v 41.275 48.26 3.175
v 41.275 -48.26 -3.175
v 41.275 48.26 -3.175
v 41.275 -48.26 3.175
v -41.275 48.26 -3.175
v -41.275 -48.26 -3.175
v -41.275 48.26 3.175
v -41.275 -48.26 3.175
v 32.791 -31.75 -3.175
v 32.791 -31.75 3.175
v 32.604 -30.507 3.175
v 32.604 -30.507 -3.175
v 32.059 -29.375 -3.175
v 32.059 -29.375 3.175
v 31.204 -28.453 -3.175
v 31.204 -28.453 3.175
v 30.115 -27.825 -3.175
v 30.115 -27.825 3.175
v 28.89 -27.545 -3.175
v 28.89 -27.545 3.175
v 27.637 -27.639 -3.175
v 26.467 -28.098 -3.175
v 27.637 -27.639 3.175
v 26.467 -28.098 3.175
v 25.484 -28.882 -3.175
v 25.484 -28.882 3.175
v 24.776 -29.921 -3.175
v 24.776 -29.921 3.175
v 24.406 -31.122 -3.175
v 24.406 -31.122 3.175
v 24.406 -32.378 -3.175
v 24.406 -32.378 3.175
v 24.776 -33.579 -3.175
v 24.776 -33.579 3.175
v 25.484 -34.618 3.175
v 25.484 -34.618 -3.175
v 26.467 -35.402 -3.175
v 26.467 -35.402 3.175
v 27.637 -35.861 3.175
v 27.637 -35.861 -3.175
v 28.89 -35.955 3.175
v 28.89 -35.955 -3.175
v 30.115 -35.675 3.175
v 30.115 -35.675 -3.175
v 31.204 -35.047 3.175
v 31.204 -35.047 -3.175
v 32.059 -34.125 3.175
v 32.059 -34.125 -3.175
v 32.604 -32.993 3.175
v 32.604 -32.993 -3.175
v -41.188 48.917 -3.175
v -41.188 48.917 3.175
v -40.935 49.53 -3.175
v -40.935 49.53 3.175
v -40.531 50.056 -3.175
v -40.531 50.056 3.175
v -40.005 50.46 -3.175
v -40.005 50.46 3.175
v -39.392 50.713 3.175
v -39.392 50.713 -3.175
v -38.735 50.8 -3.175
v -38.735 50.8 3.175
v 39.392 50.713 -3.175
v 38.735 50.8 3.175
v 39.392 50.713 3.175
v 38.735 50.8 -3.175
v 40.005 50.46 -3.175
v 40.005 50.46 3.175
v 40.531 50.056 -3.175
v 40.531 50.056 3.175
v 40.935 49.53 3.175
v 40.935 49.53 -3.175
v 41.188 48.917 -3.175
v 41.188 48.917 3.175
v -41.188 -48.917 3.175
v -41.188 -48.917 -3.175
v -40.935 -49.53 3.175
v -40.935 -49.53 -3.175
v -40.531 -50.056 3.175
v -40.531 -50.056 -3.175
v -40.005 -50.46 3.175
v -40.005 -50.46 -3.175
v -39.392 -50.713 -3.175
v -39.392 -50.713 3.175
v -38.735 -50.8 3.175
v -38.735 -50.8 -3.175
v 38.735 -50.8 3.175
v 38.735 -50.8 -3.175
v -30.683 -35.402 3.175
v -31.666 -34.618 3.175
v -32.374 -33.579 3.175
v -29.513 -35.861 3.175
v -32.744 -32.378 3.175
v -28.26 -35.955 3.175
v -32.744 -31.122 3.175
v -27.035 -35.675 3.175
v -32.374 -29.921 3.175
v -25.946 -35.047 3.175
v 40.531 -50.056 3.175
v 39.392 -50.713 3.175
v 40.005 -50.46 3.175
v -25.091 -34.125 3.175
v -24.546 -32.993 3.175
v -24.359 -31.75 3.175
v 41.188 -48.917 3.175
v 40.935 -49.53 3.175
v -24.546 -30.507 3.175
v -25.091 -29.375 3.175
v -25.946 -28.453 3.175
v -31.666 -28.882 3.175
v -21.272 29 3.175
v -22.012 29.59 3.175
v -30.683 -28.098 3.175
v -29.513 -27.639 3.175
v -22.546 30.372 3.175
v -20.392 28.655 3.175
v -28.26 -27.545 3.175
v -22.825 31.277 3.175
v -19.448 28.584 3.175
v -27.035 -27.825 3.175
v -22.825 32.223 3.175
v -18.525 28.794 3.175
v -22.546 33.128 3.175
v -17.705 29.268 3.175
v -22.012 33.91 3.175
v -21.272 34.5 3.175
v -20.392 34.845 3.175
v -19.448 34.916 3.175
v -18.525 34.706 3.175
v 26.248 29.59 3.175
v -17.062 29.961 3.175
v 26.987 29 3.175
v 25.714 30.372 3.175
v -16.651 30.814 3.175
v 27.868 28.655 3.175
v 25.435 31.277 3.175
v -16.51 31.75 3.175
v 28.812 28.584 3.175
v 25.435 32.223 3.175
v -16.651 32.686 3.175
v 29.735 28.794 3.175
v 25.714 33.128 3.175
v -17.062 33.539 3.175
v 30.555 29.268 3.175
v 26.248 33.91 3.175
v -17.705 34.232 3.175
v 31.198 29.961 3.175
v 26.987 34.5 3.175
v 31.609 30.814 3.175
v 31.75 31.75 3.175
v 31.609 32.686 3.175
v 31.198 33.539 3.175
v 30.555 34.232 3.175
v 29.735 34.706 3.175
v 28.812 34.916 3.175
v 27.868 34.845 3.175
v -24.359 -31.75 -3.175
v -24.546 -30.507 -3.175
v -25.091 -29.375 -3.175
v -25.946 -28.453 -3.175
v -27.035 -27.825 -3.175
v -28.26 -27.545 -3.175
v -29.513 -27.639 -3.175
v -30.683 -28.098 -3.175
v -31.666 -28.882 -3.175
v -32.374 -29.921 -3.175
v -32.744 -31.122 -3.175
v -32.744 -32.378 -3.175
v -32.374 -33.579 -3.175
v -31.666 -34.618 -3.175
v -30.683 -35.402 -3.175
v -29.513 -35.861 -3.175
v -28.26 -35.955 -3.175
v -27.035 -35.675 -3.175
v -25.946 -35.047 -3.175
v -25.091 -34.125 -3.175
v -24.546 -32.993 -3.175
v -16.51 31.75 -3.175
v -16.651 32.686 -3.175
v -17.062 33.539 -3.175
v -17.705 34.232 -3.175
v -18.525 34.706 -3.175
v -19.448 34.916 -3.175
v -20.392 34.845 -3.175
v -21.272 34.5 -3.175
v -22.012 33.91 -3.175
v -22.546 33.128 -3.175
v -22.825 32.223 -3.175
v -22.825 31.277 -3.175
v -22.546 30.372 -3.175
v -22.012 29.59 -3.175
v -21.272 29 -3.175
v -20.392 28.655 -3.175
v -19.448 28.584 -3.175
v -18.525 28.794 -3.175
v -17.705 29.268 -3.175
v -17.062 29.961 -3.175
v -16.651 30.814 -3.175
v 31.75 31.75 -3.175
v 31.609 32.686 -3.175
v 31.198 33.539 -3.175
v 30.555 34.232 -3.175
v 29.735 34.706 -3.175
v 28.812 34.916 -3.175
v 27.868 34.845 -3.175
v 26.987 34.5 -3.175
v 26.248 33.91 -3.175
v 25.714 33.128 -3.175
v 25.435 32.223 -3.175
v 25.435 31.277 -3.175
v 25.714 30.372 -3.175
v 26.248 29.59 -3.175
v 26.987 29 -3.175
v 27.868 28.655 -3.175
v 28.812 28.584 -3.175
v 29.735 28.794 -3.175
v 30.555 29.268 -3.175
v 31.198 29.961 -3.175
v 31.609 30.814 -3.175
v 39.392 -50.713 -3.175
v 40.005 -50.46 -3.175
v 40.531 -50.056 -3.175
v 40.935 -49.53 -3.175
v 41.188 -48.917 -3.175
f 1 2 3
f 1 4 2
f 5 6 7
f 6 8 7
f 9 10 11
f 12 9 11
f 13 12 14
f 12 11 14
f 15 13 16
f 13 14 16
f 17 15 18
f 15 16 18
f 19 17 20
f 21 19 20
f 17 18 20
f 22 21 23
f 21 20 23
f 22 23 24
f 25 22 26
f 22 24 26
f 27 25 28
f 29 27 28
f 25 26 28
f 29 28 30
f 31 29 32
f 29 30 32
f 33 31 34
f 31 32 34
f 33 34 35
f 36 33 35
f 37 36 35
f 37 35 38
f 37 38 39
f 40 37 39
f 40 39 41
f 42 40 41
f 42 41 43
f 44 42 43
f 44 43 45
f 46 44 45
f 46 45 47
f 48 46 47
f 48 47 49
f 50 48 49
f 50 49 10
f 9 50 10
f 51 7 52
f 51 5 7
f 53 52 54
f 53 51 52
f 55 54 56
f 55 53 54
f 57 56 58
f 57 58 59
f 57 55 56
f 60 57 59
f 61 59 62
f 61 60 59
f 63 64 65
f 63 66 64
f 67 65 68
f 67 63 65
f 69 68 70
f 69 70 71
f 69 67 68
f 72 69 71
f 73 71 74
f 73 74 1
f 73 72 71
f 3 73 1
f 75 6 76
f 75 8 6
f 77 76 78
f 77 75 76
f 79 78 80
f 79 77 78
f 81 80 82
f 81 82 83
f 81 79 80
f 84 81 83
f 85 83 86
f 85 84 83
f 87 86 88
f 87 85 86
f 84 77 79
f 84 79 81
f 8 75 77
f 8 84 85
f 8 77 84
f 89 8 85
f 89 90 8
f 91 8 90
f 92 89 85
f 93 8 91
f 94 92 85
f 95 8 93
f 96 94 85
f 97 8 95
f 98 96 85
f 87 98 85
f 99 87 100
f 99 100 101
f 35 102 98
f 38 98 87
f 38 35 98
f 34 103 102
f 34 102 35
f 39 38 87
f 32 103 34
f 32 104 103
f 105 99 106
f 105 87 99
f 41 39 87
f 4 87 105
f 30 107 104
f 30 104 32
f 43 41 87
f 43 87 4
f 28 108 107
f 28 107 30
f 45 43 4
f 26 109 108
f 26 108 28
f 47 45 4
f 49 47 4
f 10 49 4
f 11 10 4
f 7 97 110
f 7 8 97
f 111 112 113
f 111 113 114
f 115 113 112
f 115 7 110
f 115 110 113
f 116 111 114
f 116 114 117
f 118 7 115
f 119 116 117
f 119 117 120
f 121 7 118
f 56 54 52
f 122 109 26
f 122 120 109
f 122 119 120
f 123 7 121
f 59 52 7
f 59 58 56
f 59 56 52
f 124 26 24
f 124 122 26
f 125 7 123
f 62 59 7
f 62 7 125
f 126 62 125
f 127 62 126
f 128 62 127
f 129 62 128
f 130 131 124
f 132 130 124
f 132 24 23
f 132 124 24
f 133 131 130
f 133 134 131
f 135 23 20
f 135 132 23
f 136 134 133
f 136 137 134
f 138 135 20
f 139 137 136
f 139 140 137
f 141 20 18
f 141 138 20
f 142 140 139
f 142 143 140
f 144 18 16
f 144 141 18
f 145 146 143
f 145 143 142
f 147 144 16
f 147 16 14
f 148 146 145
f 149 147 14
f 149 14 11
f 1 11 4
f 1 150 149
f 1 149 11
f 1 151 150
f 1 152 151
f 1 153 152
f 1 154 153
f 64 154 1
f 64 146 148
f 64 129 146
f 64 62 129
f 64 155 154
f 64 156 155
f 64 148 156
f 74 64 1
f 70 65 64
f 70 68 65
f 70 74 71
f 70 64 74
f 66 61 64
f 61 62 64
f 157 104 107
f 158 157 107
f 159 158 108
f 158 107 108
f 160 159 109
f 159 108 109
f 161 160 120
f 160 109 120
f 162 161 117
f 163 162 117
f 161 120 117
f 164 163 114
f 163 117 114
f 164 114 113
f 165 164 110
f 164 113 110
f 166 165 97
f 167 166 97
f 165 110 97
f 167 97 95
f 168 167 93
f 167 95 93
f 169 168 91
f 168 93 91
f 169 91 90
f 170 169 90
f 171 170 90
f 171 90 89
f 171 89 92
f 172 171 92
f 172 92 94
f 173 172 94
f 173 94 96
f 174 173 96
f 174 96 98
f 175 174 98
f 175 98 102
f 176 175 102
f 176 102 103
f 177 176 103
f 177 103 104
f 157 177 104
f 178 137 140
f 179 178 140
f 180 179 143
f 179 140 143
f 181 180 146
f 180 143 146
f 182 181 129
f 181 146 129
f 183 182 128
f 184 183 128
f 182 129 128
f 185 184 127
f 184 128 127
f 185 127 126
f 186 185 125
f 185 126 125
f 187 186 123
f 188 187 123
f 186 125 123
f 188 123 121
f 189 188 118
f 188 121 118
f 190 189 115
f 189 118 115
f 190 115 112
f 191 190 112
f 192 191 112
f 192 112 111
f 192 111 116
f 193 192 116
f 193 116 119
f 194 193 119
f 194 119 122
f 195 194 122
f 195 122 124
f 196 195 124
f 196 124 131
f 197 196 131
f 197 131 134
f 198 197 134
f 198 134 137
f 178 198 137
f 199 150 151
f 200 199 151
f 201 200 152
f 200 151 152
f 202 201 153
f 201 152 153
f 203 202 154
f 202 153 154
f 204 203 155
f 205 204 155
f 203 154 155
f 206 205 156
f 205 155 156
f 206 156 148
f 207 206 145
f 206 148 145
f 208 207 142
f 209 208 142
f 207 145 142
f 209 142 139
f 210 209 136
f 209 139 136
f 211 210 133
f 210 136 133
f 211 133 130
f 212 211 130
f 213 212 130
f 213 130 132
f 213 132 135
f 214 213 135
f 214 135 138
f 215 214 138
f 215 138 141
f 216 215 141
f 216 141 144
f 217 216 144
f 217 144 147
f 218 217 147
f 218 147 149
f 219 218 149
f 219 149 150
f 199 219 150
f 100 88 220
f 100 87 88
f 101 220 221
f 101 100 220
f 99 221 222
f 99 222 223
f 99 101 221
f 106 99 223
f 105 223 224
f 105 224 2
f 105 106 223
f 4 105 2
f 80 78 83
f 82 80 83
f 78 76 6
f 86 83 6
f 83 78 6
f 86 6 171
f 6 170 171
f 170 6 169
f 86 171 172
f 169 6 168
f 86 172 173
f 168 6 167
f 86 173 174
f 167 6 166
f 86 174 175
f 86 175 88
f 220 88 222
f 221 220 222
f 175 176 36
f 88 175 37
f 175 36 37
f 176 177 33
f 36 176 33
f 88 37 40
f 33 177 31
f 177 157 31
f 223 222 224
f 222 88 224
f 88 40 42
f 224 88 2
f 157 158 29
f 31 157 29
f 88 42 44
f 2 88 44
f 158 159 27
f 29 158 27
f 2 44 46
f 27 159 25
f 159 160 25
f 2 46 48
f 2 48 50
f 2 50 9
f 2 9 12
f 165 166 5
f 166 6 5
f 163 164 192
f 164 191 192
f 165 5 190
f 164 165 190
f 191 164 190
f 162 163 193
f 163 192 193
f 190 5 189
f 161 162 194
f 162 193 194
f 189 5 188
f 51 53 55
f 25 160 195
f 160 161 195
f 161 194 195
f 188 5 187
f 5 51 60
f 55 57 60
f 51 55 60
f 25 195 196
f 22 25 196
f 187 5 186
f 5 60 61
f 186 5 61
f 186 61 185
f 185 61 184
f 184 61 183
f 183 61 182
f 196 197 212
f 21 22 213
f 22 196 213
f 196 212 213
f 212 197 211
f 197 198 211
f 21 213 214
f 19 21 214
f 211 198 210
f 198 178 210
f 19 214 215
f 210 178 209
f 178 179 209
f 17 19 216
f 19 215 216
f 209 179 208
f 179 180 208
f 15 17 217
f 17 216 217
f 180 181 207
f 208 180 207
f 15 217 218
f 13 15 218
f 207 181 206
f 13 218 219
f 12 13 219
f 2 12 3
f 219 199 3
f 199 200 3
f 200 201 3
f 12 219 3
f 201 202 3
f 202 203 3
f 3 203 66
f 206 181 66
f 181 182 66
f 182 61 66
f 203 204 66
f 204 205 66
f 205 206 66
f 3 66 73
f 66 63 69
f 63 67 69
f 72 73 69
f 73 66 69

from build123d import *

# Parameters (mm, degrees)
SKETCH1_W           = 82.55
SKETCH1_H           = 101.6
BOSS_EXTRUDE1_DEPTH = 3.175
SKETCH2_R           = 3.175
SKETCH2_R_2         = 4.2164
CUT_EXTRUDE1_DEPTH  = 66.761600688
FILLET1_R           = 2.54


with BuildPart() as part:
    # Sketch1 → Boss-Extrude1 (new, symmetric)
    with BuildSketch(Plane.XY):
        Rectangle(SKETCH1_W, SKETCH1_H)
    extrude(amount=BOSS_EXTRUDE1_DEPTH, both=True)

    # Sketch2 → Cut-Extrude1 (cut, through all)
    with BuildSketch(Plane.XY.offset(3.175)):
        with Locations((-19.685, 31.75)):
            Circle(SKETCH2_R)
        with Locations((28.575, -31.75)):
            Circle(SKETCH2_R_2)
        with Locations((-28.575, -31.75)):
            Circle(SKETCH2_R_2)
        with Locations((28.575, 31.75)):
            Circle(SKETCH2_R)
    extrude(amount=-CUT_EXTRUDE1_DEPTH, mode=Mode.SUBTRACT)

    # Fillet1
    fillet1_edges = [part.edges().sort_by_distance(p)[0] for p in [
        (41.275, -50.8, 0),
        (-41.275, -50.8, 0),
        (-41.275, 50.8, 0),
        (41.275, 50.8, 0),
    ]]
    fillet(fillet1_edges, radius=FILLET1_R)


solid = part.part
